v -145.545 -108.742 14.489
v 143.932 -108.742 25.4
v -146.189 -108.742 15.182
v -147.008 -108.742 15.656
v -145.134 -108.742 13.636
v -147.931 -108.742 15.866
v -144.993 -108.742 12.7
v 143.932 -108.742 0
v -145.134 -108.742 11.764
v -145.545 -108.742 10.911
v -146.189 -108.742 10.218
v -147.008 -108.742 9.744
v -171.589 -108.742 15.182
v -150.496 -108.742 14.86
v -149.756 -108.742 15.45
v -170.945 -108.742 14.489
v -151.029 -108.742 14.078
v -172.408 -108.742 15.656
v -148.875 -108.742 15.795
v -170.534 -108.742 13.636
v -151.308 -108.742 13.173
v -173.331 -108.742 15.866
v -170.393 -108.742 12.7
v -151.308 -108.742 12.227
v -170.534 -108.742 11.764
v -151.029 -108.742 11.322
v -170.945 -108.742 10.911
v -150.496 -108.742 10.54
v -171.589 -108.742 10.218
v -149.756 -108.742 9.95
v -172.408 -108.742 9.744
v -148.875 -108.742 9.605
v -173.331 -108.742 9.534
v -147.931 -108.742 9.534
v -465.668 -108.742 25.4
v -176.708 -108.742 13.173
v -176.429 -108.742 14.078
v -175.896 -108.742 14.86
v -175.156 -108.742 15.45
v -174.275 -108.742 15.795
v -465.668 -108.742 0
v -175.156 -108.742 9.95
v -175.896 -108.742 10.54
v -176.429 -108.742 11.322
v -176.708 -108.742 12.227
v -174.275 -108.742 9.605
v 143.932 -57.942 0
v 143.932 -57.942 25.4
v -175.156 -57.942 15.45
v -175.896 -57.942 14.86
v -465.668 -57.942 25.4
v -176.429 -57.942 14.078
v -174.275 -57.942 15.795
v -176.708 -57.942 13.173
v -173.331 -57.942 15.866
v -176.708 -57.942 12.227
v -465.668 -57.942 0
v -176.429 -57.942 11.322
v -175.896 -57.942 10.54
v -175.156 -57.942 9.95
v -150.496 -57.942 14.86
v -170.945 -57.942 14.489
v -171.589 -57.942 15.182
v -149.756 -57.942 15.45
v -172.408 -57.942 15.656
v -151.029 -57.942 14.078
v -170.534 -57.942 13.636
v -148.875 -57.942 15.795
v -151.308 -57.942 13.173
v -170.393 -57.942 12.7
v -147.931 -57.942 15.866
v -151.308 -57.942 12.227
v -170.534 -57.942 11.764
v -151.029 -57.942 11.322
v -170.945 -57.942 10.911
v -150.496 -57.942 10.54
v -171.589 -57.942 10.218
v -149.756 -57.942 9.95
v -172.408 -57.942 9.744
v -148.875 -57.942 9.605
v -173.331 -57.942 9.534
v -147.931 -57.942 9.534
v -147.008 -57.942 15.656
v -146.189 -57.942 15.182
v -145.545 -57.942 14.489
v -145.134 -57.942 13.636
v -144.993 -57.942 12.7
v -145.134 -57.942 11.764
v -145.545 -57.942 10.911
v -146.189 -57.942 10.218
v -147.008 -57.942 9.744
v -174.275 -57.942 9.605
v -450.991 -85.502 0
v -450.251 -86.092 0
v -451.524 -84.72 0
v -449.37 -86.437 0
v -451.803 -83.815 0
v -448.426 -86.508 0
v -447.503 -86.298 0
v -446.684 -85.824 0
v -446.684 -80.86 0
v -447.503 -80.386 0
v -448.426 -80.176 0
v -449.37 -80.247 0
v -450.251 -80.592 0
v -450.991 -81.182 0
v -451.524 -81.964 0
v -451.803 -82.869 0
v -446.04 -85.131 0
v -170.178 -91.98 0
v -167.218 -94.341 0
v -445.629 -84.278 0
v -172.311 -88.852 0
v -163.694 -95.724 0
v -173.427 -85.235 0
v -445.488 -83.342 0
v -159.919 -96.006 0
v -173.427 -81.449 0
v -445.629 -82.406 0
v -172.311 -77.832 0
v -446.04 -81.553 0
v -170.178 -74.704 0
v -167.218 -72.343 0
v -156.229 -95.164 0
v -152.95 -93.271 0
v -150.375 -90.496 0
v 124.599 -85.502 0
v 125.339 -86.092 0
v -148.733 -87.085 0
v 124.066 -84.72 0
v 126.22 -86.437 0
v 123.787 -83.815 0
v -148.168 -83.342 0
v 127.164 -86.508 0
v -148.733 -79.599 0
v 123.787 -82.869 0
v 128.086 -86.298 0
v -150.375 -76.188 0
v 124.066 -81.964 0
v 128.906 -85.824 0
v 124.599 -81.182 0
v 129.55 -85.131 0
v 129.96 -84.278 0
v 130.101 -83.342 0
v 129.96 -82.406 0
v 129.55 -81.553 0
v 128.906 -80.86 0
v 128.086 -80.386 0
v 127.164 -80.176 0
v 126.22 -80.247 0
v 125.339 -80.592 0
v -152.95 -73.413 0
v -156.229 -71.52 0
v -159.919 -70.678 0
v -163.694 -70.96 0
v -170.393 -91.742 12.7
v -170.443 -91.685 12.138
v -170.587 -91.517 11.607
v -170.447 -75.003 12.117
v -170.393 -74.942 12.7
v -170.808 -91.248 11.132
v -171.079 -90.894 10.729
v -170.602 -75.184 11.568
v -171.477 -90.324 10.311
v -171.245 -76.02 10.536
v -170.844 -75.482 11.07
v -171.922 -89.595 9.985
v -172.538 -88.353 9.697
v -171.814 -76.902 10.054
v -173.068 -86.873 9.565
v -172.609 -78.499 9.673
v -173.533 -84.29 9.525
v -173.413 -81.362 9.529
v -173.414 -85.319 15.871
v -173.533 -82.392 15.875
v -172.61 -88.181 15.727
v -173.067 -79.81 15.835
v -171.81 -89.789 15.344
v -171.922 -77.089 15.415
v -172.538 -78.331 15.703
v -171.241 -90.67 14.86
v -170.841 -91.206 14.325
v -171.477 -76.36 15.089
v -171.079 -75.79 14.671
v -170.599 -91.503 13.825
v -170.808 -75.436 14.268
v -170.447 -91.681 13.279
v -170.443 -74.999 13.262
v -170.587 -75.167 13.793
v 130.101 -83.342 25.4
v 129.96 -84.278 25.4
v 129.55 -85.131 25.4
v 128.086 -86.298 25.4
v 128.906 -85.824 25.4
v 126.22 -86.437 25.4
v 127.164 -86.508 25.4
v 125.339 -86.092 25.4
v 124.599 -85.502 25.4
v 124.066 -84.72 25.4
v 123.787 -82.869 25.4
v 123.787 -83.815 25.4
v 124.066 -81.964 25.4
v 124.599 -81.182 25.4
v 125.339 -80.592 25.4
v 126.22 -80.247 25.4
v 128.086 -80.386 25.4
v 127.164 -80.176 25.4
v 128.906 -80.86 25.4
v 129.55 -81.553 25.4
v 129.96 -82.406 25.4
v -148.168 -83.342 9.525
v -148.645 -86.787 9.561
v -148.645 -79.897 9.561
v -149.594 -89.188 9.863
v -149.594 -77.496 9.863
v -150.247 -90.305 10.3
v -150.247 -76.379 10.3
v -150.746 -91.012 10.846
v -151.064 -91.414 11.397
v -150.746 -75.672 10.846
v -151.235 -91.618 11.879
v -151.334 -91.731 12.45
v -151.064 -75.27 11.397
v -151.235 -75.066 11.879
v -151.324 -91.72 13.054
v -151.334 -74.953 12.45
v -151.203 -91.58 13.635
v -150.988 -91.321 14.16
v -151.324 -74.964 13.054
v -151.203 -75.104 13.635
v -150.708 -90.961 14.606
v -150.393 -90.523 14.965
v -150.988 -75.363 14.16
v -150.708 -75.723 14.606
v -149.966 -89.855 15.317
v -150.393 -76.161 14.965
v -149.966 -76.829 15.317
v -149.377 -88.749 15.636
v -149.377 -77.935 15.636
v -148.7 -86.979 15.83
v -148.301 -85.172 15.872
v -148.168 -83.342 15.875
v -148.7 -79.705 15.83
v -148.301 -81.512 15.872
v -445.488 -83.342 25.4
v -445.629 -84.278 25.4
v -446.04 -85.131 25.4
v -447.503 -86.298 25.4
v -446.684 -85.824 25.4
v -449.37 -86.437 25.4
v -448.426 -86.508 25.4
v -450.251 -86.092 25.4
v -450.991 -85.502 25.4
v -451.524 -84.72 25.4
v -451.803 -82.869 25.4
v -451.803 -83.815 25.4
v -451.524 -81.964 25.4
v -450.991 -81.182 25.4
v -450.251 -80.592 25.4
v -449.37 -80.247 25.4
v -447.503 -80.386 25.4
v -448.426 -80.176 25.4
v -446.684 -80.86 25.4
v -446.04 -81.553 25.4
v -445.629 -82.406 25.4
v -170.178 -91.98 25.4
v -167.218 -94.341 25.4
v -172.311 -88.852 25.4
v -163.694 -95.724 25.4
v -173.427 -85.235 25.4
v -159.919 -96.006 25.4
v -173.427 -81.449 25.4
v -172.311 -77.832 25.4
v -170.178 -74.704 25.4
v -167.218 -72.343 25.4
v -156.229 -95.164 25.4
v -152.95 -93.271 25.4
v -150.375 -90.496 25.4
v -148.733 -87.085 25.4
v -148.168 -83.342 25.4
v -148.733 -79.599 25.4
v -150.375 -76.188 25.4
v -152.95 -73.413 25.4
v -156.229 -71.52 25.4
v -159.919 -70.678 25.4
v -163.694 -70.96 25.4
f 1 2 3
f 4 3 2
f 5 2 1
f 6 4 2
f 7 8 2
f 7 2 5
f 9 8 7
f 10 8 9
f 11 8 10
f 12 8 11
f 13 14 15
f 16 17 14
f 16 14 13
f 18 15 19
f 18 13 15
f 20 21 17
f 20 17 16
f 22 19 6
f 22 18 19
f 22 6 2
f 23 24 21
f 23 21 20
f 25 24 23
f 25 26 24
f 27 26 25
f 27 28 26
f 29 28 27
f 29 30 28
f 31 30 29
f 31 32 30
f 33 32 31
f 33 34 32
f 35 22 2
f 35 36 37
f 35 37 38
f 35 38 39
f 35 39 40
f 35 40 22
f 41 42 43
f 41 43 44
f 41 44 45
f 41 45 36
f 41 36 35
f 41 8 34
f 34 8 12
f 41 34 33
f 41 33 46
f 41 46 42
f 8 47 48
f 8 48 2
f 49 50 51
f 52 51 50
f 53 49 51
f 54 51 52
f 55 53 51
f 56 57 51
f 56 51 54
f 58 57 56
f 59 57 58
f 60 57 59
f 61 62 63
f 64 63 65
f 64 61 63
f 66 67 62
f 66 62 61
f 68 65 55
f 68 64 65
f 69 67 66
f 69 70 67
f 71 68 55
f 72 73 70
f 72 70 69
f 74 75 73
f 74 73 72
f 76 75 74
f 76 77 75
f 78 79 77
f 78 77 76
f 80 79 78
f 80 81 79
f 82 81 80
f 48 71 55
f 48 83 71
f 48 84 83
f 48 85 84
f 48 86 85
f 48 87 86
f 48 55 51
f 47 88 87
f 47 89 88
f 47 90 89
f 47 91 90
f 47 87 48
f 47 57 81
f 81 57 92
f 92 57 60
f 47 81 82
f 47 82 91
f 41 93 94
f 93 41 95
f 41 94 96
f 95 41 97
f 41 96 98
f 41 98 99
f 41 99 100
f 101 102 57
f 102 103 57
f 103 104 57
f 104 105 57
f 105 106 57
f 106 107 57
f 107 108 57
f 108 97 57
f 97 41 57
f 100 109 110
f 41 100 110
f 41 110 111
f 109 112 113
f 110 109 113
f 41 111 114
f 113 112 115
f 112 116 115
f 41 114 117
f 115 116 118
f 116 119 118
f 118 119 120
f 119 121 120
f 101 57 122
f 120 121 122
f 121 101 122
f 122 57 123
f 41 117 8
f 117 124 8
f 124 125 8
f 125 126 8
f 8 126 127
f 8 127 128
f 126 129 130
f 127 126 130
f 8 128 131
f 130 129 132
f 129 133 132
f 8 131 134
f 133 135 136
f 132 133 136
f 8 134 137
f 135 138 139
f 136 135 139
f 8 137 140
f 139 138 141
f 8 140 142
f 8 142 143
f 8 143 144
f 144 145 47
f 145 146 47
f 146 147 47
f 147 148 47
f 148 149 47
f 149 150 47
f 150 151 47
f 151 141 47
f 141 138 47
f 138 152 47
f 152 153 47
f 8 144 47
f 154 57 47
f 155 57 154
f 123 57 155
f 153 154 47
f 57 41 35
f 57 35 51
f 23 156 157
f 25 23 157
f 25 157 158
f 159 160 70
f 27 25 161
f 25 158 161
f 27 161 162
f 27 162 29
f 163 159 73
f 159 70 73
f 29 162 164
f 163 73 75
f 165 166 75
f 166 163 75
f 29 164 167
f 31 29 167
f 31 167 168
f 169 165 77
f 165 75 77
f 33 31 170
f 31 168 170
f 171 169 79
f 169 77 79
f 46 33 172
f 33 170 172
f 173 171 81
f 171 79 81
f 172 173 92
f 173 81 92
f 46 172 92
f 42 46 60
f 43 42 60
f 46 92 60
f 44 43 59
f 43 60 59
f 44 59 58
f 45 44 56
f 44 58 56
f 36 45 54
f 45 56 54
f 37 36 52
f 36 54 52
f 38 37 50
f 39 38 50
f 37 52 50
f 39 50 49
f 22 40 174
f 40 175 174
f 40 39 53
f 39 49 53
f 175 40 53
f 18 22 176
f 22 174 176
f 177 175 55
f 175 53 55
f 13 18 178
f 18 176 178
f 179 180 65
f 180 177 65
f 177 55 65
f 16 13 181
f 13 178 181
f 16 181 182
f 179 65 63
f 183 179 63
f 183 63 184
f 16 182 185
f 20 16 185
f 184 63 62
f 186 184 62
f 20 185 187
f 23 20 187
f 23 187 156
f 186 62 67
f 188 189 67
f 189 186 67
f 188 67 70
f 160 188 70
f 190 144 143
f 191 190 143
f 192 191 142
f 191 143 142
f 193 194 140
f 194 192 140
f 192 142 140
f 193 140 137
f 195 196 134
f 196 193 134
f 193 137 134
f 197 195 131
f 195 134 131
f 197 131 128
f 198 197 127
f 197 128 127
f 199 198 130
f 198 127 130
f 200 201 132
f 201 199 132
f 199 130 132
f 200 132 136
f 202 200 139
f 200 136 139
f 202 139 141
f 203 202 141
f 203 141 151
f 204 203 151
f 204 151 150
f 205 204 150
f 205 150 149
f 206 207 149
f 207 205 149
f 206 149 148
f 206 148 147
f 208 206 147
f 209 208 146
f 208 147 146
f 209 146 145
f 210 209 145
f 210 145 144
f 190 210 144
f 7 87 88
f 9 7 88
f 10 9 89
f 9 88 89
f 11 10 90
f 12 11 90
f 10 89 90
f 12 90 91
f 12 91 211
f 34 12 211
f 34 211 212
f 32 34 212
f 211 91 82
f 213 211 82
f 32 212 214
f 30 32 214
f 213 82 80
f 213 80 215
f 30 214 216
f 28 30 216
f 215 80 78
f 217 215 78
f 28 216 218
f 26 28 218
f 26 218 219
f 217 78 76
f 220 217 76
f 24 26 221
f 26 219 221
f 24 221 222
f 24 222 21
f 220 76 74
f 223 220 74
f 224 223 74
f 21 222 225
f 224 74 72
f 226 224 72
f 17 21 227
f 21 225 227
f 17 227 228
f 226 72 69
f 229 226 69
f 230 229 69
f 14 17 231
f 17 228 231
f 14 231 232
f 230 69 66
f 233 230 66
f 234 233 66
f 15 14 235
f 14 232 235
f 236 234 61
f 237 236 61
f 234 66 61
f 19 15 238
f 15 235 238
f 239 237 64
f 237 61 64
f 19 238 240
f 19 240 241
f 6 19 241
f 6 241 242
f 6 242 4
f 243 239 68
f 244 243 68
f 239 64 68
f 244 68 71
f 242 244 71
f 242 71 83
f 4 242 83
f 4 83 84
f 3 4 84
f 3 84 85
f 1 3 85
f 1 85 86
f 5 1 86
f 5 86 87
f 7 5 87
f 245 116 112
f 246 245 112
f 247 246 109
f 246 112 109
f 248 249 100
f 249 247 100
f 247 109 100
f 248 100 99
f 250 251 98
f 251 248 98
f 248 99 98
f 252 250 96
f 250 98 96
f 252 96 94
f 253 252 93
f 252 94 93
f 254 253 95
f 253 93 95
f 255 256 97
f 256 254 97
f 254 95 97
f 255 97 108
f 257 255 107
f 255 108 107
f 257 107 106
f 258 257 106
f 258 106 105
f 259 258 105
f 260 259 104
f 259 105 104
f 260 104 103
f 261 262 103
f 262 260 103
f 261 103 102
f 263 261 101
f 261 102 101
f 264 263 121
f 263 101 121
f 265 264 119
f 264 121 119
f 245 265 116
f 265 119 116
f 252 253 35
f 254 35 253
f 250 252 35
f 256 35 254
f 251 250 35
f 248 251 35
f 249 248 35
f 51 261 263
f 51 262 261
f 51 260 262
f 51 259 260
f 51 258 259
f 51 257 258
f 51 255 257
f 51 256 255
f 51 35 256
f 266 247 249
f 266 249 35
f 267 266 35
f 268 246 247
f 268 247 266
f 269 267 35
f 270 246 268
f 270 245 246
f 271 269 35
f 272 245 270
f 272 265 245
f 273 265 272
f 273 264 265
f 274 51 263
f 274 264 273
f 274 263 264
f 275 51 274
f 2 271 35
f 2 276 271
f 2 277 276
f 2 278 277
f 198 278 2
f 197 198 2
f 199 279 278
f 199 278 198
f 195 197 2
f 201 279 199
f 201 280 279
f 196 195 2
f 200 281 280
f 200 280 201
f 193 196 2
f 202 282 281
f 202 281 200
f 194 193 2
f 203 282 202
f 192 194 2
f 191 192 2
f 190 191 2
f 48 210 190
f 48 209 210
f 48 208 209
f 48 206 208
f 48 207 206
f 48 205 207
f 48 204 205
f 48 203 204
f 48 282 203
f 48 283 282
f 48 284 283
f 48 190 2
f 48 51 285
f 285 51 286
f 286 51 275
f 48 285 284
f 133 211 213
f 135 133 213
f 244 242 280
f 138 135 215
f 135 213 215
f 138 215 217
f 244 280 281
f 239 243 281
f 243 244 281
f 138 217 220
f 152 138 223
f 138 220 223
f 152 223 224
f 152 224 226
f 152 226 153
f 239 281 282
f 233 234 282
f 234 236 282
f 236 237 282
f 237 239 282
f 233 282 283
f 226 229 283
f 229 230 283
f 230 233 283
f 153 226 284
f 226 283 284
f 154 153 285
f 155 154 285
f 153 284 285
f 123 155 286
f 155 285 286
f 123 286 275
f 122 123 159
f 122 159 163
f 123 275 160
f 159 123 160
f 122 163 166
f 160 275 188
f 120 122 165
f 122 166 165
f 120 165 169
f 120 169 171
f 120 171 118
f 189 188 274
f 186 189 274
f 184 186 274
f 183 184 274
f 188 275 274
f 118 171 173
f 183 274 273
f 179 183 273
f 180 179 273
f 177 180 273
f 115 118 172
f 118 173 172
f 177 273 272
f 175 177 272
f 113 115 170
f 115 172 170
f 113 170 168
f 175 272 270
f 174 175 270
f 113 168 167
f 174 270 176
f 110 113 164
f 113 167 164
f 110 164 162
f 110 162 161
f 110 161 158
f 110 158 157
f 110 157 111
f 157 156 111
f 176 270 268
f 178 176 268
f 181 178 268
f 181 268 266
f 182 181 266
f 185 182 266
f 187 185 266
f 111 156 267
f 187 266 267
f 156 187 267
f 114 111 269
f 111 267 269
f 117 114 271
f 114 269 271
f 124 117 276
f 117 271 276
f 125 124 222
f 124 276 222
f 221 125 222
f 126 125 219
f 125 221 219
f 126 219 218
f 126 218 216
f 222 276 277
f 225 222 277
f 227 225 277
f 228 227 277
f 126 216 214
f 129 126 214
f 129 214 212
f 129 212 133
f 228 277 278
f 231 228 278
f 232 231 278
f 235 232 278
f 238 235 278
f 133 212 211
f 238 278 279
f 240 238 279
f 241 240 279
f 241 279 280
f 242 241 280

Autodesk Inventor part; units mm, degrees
ref_plane "YZ Plane" through (0, 0, 0) normal (1, 0, 0) x (0, 1, 0)
ref_plane "XZ Plane" through (0, 0, 0) normal (0, 1, 0) x (-1, 0, 0)
ref_plane "XY Plane" through (0, 0, 0) normal (0, 0, 1) x (1, 0, 0)
sketch "Sketch1" plane through (0, 0, 0) normal (0, 0, 1) x (1, 0, 0)
  line L0 (-465.6684, -57.942) -> (143.9316, -57.942)
  line L1 (143.9316, -57.942) -> (143.9316, -108.742)
  line L2 (143.9316, -108.742) -> (-465.6684, -108.742)
  line L3 (-465.6684, -108.742) -> (-465.6684, -57.942)
  line L4 (-465.6684, -83.342) -> (143.9316, -83.342) construction
  circle A0 centre (-448.6631, -83.342) radius 3.175
  circle A1 centre (126.9263, -83.342) radius 3.175
  line L5 (-160.8684, -57.942) -> (-160.8684, -108.742) construction
  point P0 (0, 0)
  dimension "d0" = 575.5894
  dimension "d1" = 287.7947
  dimension "d2" = 609.6
  dimension "d3" = 6.35
  dimension "d4" = 50.8
extrude "Extrusion1" add sketch "Sketch1" along normal blind 25.4
sketch "Sketch2" plane through (-465.6684, -57.942, 0) normal (0, 1, 0) x (1, 0, 0)
  line L0 (0, 0) -> (0, -25.4) construction
  line L1 (0, -12.7) -> (609.6, -12.7) construction
  line L2 (609.6, 0) -> (609.6, -25.4) construction
  line L3 (0, -25.4) -> (609.6, -25.4) construction
  line L4 (304.8, -25.4) -> (304.8, 0) construction
  line L5 (0, 0) -> (609.6, 0) construction
  circle A0 centre (292.1, -12.7) radius 3.175
  circle A1 centre (317.5, -12.7) radius 3.175
  point P0 (465.6684, 0)
  dimension "d7" = 6.35
  dimension "d8" = 12.7
  dimension "d9" = 12.7
extrude "Extrusion2" cut sketch "Sketch2" against normal through all
sketch "Sketch3" plane through (0, 0, 25.4) normal (0, 0, 1) x (1, 0, 0)
  line L0 (-465.6684, -57.942) -> (-465.6684, -108.742) construction
  line L1 (-465.6684, -83.342) -> (143.9316, -83.342) construction
  line L2 (143.9316, -108.742) -> (143.9316, -57.942) construction
  line L3 (143.9316, -57.942) -> (-465.6684, -57.942) construction
  line L4 (-160.8684, -57.942) -> (-160.8684, -108.742) construction
  line L5 (-465.6684, -108.742) -> (143.9316, -108.742) construction
  circle A0 centre (-160.8684, -83.342) radius 12.7
  point P0 (0, 0)
  dimension "d12" = 25.4
extrude "Extrusion3" cut sketch "Sketch3" against normal through all
equation "\"d1\" = 0.5 * d0"
equation "\"d9\" = d8"
properties part number "Steering Axle"
